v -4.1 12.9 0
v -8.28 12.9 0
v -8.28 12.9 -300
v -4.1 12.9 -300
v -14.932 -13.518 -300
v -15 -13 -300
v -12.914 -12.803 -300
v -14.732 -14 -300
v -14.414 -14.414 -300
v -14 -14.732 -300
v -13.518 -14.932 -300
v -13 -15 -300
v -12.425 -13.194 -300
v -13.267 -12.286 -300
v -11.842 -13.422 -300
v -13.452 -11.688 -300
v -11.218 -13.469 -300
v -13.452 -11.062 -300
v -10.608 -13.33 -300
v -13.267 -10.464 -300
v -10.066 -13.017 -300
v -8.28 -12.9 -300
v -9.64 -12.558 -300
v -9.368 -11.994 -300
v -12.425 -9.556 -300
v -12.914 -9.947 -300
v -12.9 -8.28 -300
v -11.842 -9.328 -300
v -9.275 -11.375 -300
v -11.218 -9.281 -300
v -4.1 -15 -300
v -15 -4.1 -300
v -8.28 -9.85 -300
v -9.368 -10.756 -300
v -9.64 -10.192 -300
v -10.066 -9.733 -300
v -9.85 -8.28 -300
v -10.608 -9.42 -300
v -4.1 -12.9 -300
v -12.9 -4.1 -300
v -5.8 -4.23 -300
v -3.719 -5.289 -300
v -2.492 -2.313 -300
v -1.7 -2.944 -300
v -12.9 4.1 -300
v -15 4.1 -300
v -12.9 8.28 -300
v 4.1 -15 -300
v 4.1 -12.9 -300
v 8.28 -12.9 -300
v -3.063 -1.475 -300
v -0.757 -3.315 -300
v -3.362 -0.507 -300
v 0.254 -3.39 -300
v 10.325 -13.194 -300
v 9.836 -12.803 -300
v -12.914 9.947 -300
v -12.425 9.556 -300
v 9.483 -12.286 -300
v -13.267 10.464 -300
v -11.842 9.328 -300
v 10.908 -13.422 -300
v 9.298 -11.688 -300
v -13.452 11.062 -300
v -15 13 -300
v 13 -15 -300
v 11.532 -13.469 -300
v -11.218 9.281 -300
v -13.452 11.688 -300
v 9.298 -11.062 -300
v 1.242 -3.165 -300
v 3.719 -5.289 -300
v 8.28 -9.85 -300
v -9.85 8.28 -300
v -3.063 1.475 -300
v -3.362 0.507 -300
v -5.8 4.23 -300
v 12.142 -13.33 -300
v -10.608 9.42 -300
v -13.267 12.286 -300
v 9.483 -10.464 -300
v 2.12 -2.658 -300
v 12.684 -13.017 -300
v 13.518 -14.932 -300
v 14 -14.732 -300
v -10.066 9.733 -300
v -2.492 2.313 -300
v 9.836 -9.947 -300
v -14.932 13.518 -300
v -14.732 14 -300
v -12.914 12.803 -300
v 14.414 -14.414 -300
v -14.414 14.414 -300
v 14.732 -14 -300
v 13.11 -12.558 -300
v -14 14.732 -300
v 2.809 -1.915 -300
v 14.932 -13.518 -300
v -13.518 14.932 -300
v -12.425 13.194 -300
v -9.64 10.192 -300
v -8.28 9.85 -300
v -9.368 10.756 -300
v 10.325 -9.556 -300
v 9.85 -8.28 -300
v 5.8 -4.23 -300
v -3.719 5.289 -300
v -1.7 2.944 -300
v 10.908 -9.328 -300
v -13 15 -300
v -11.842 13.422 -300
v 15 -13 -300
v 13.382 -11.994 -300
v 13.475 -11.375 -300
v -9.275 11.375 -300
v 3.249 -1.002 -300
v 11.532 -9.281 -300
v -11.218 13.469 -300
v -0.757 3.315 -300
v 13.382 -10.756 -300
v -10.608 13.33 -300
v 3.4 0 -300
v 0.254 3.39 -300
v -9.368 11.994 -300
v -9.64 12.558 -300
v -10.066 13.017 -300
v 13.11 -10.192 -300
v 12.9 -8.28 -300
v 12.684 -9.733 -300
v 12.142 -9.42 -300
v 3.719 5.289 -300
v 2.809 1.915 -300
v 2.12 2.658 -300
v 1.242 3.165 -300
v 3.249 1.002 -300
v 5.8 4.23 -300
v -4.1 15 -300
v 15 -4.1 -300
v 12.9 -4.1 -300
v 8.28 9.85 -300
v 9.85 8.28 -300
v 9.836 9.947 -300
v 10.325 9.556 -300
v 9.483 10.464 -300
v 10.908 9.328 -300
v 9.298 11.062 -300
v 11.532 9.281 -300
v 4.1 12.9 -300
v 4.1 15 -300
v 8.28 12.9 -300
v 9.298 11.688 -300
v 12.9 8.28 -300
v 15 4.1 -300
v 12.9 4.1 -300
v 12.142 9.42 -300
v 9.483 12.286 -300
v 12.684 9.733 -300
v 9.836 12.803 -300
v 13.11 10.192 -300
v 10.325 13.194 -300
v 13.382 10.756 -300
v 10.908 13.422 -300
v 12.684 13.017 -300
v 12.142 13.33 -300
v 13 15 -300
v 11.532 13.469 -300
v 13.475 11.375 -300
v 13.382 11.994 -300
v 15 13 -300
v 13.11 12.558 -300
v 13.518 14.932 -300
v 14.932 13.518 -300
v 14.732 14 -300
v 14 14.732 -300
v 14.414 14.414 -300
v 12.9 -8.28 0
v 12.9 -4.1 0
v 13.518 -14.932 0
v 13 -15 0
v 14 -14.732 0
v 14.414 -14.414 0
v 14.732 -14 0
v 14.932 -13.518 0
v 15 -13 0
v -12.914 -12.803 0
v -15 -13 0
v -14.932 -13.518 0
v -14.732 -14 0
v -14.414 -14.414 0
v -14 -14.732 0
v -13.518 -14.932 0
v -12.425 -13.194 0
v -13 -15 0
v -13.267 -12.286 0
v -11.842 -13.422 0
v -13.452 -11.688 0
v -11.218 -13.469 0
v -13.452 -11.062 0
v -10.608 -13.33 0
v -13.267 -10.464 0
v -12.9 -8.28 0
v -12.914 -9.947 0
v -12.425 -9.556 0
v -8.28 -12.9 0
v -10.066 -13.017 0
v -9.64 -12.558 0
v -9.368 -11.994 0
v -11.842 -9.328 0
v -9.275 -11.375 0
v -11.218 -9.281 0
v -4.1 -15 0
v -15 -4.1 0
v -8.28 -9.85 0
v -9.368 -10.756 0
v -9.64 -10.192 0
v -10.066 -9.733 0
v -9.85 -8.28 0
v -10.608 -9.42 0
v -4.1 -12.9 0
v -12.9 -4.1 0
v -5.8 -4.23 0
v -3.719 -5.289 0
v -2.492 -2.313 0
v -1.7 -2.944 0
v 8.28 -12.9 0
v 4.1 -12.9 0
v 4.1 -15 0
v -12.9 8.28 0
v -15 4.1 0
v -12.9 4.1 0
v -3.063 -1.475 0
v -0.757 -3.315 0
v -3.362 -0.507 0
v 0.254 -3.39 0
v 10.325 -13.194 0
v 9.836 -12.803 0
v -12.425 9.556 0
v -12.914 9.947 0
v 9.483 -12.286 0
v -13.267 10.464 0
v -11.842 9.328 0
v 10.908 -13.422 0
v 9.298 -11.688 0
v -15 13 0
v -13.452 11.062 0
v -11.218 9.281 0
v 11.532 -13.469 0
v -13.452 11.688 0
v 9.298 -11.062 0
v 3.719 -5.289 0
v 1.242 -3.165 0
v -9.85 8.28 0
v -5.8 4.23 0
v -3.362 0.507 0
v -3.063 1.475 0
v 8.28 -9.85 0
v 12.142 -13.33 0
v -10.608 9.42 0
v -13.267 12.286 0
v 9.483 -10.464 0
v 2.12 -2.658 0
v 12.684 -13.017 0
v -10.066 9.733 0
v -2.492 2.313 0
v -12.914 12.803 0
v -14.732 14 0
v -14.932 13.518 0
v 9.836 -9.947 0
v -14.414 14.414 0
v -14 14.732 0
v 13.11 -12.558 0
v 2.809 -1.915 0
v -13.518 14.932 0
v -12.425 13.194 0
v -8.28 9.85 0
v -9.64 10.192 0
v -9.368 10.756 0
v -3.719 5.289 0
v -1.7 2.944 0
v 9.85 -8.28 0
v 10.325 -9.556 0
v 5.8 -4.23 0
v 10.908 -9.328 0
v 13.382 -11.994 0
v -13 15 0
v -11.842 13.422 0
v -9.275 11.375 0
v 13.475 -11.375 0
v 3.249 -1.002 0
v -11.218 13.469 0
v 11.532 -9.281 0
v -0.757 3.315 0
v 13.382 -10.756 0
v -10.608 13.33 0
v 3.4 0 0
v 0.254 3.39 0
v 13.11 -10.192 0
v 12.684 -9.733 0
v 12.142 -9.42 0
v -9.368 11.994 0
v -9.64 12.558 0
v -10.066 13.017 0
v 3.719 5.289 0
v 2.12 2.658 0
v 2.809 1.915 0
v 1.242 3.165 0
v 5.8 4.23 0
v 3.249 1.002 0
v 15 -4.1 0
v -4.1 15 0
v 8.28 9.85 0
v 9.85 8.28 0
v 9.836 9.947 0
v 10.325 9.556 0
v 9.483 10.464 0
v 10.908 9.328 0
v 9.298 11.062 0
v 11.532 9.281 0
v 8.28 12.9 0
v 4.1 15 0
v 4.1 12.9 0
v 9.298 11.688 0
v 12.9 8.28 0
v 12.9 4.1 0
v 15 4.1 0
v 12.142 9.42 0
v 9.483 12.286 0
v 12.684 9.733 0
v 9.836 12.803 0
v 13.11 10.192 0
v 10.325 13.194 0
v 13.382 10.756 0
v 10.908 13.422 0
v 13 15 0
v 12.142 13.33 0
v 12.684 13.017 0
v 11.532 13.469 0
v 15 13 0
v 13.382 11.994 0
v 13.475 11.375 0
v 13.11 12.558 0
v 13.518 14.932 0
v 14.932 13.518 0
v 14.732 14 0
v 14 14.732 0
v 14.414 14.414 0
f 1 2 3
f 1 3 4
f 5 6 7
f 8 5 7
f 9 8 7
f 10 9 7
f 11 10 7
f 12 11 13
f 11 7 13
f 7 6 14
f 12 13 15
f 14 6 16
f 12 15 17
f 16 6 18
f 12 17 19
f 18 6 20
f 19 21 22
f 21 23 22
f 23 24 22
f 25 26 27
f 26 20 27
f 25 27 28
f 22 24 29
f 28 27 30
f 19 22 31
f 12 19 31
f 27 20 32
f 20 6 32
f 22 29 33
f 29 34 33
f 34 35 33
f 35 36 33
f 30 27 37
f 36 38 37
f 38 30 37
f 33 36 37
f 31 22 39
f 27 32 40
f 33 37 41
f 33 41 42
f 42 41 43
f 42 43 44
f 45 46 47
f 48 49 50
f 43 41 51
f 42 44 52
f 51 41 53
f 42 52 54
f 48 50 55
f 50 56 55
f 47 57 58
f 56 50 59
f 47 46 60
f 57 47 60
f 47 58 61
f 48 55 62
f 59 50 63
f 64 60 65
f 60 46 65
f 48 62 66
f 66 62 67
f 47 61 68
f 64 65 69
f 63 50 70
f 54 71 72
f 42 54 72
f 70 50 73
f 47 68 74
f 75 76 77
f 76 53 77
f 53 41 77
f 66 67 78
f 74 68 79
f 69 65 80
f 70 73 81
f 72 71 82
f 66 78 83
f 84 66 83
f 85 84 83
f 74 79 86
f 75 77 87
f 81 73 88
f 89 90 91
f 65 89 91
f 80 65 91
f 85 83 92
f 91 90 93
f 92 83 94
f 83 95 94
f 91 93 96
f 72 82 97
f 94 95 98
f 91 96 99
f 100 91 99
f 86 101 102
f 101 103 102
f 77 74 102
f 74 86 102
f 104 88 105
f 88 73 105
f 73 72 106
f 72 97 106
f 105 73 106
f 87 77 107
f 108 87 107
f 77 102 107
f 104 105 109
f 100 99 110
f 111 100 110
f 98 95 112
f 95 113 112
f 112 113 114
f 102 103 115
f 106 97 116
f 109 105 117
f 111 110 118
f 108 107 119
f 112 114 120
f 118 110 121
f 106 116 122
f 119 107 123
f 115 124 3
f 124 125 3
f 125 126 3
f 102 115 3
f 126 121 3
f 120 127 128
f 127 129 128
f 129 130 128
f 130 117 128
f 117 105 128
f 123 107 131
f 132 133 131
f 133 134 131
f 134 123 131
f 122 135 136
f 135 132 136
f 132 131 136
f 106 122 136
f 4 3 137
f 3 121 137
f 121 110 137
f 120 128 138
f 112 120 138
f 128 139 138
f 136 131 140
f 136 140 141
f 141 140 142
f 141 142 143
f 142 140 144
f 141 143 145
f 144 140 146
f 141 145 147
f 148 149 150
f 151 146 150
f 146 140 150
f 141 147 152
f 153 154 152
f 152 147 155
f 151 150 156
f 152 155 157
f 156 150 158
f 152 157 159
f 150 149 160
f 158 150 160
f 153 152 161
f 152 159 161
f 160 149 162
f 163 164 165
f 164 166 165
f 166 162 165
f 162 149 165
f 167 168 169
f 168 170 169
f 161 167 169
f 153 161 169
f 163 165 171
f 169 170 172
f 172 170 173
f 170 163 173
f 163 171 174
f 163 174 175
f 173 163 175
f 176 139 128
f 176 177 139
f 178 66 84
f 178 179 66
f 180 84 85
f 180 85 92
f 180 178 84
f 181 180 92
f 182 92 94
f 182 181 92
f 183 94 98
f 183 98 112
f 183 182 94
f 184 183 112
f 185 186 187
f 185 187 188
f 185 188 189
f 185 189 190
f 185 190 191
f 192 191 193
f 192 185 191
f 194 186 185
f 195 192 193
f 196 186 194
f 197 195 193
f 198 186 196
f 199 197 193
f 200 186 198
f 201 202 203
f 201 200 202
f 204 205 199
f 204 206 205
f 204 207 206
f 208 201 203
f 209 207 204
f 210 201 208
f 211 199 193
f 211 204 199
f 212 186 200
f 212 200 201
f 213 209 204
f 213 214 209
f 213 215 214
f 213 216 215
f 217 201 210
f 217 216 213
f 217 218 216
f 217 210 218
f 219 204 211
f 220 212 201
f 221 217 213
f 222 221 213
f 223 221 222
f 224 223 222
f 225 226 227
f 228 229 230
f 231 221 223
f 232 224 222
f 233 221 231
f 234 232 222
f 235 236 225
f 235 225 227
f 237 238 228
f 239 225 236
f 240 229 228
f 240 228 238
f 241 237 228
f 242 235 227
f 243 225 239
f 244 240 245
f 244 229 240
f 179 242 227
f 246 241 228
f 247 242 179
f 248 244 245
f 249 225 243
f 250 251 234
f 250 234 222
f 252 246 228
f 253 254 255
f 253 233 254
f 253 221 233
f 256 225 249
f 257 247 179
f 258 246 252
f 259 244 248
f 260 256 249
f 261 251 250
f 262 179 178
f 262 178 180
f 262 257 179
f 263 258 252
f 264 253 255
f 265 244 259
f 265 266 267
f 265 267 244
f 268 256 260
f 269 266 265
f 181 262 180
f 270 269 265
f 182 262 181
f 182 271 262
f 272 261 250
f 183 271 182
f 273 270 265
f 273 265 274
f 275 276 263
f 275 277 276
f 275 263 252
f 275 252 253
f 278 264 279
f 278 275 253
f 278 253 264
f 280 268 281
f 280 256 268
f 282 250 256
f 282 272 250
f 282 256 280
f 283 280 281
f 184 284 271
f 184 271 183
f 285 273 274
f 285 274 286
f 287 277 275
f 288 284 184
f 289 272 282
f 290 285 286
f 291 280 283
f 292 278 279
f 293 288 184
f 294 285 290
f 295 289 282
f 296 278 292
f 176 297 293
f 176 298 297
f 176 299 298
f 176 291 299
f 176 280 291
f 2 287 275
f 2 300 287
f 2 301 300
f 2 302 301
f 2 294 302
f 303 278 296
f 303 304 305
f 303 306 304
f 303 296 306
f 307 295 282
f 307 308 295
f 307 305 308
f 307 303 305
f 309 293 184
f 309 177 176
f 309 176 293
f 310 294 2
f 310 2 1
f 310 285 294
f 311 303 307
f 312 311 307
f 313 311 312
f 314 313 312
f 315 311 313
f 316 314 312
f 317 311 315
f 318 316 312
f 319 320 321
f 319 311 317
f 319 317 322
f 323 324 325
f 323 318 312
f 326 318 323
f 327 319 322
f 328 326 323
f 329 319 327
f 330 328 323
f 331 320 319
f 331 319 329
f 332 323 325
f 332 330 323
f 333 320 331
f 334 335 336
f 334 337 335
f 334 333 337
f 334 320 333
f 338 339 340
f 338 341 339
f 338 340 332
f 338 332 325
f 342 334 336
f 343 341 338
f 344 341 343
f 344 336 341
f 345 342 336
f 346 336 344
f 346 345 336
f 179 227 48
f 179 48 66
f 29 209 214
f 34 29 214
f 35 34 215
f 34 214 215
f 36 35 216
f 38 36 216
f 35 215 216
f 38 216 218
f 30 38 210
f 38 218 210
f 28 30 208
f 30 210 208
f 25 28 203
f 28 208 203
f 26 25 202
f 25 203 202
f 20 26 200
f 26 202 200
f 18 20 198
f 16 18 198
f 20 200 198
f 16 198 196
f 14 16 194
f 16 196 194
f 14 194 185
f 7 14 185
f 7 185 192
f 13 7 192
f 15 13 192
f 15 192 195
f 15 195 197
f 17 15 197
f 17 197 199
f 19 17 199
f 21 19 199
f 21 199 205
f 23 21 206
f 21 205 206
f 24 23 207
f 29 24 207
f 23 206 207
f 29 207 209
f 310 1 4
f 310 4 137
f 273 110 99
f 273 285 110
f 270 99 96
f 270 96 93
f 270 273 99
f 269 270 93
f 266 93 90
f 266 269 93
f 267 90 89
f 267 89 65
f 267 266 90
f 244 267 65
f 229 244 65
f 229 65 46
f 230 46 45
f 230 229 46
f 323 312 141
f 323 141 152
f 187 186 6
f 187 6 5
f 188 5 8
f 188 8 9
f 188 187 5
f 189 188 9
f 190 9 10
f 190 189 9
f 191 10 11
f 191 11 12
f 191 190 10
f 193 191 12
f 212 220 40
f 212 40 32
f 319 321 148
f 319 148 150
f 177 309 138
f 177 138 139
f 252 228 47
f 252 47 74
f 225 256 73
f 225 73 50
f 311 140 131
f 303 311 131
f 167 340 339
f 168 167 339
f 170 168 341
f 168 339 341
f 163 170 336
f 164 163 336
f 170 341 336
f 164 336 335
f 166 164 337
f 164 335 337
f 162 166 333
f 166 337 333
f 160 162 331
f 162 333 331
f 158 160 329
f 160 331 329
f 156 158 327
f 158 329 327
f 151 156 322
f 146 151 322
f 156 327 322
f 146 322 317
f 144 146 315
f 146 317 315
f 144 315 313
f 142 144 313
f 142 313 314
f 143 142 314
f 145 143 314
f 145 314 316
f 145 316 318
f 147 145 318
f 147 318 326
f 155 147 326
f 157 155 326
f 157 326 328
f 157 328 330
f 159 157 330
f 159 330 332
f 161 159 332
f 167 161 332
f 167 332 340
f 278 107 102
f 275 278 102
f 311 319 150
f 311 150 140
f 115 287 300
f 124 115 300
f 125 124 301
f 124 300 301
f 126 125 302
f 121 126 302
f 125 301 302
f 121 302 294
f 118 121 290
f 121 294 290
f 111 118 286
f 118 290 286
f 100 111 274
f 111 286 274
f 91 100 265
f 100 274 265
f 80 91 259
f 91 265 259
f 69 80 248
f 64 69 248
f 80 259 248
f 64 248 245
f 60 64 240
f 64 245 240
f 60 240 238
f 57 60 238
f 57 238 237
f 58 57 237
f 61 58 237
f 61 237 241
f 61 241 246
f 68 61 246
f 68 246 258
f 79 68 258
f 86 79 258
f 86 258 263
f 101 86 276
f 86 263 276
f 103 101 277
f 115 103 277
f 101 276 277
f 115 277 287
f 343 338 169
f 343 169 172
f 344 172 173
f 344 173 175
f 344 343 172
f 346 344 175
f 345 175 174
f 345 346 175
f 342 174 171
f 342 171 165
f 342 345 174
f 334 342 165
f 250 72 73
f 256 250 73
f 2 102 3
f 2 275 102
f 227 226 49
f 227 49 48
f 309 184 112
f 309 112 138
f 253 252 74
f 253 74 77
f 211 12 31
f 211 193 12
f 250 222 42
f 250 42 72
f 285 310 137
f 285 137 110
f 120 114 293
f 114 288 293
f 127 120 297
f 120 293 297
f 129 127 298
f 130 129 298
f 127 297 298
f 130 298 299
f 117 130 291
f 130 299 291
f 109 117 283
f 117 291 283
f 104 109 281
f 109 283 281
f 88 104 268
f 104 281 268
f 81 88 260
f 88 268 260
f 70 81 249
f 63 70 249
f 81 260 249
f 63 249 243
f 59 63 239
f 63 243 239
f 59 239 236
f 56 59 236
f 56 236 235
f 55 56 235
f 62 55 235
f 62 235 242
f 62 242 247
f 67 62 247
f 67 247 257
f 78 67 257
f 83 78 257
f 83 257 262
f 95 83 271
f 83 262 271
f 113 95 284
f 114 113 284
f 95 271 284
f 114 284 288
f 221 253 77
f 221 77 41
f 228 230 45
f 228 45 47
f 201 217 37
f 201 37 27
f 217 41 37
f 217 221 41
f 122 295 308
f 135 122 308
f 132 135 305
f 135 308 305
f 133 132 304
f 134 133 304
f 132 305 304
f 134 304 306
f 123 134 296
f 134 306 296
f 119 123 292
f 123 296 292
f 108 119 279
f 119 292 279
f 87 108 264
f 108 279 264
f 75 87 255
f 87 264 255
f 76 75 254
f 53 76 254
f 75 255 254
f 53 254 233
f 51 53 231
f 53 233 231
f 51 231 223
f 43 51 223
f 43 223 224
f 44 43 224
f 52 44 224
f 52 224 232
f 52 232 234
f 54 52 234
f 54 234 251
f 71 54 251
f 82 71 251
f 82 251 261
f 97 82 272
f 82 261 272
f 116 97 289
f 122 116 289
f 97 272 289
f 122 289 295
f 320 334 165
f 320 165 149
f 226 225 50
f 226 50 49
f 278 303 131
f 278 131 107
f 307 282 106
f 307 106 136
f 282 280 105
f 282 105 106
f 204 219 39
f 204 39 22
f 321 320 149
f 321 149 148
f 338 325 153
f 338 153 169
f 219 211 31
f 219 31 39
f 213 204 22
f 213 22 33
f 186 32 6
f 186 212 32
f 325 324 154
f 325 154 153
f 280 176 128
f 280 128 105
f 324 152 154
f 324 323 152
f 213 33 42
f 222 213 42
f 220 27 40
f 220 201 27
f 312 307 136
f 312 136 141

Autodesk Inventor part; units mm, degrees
ref_plane "YZ Plane" through (0, 0, 0) normal (1, 0, 0) x (0, 1, 0)
ref_plane "XZ Plane" through (0, 0, 0) normal (0, 1, 0) x (-1, 0, 0)
ref_plane "XY Plane" through (0, 0, 0) normal (0, 0, 1) x (1, 0, 0)
sketch "Sketch1" plane through (0, 0, 0) normal (0, 0, 1) x (1, 0, 0)
  circle A0 centre (-11.375, 11.375) radius 2.1
  circle A1 centre (-11.375, -11.375) radius 2.1
  line L0 (-15, 4.1) -> (-12.9, 4.1)
  line L1 (-12.9, 4.1) -> (-12.9, 8.28)
  line L2 (-12.9, 8.28) -> (-9.85, 8.28)
  line L3 (-9.85, 8.28) -> (-5.8, 4.23)
  line L4 (-5.8, 4.23) -> (-5.8, -4.23)
  line L5 (-5.8, -4.23) -> (-9.85, -8.28)
  line L6 (-9.85, -8.28) -> (-12.9, -8.28)
  line L7 (-12.9, -8.28) -> (-12.9, -4.1)
  line L8 (-12.9, -4.1) -> (-15, -4.1)
  line L9 (-15, -4.1) -> (-15, -13)
  arc A2 (-15, -13) -> (-13, -15) centre (-13, -13) ccw
  line L10 (-13, -15) -> (-4.1, -15)
  line L11 (-4.1, -15) -> (-4.1, -12.9)
  line L12 (-4.1, -12.9) -> (-8.28, -12.9)
  line L13 (-8.28, -12.9) -> (-8.28, -9.85)
  line L14 (-8.28, -9.85) -> (-3.719, -5.289)
  line L15 (-3.719, -5.289) -> (3.719, -5.289)
  line L16 (3.719, -5.289) -> (8.28, -9.85)
  line L17 (8.28, -9.85) -> (8.28, -12.9)
  line L18 (8.28, -12.9) -> (4.1, -12.9)
  line L19 (4.1, -12.9) -> (4.1, -15)
  line L20 (4.1, -15) -> (13, -15)
  arc A3 (13, -15) -> (15, -13) centre (13, -13) ccw
  line L21 (15, -13) -> (15, -4.1)
  line L22 (15, -4.1) -> (12.9, -4.1)
  line L23 (12.9, -4.1) -> (12.9, -8.28)
  line L24 (12.9, -8.28) -> (9.85, -8.28)
  line L25 (9.85, -8.28) -> (5.8, -4.23)
  line L26 (5.8, -4.23) -> (5.8, 4.23)
  line L27 (5.8, 4.23) -> (9.85, 8.28)
  line L28 (9.85, 8.28) -> (12.9, 8.28)
  line L29 (12.9, 8.28) -> (12.9, 4.1)
  line L30 (12.9, 4.1) -> (15, 4.1)
  line L31 (15, 4.1) -> (15, 13)
  arc A4 (15, 13) -> (13, 15) centre (13, 13) ccw
  line L32 (13, 15) -> (4.1, 15)
  line L33 (4.1, 15) -> (4.1, 12.9)
  line L34 (4.1, 12.9) -> (8.28, 12.9)
  line L35 (8.28, 12.9) -> (8.28, 9.85)
  line L36 (8.28, 9.85) -> (3.719, 5.289)
  line L37 (3.719, 5.289) -> (-3.719, 5.289)
  line L38 (-3.719, 5.289) -> (-8.28, 9.85)
  line L39 (-8.28, 9.85) -> (-8.28, 12.9)
  line L40 (-8.28, 12.9) -> (-4.1, 12.9)
  line L41 (-4.1, 12.9) -> (-4.1, 15)
  line L42 (-4.1, 15) -> (-13, 15)
  arc A5 (-13, 15) -> (-15, 13) centre (-13, 13) ccw
  line L43 (-15, 13) -> (-15, 4.1)
  circle A6 centre (0, 0) radius 3.4
  circle A7 centre (11.375, 11.375) radius 2.1
  circle A8 centre (11.375, -11.375) radius 2.1
extrude "Extrusion1" add sketch "Sketch1" against normal blind 300
sketch "Sketch2" plane through (-13, 15, 0) normal (0, 1, 0) x (1, 0, 0)
  point P0 (13, 0)
properties part number "Metal Profile 30 cm" material "Aluminum 6061-AHC"
